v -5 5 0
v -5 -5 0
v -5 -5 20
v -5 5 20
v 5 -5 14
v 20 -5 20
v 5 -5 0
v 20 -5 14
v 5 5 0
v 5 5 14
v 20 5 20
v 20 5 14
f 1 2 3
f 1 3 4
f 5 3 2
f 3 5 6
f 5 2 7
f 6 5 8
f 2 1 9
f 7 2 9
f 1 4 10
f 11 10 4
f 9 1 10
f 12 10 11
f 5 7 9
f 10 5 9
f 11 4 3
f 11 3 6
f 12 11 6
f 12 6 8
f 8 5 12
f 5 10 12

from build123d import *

# Parameters (mm, degrees)
SCHIZZO1_W                   = 10
SCHIZZO1_H                   = 10
ESTRUSIONE_ESTRUSIONE1_DEPTH = 20
SCHIZZO2_W                   = 15
SCHIZZO2_H                   = 6
ESTRUSIONE_ESTRUSIONE2_DEPTH = 5


with BuildPart() as part:
    # Schizzo1 → Estrusione-Estrusione1 (new body)
    with BuildSketch(Plane.XY):
        Rectangle(SCHIZZO1_W, SCHIZZO1_H)
    extrude(amount=ESTRUSIONE_ESTRUSIONE1_DEPTH)

    # Schizzo2 → Estrusione-Estrusione2 (add, symmetric)
    with BuildSketch(Plane(origin=(0, 0, 0), x_dir=(1, 0, 0), z_dir=(0, 1, 0))):
        with Locations((12.5, -17)):
            Rectangle(SCHIZZO2_W, SCHIZZO2_H)
    extrude(amount=ESTRUSIONE_ESTRUSIONE2_DEPTH, both=True)


solid = part.part
